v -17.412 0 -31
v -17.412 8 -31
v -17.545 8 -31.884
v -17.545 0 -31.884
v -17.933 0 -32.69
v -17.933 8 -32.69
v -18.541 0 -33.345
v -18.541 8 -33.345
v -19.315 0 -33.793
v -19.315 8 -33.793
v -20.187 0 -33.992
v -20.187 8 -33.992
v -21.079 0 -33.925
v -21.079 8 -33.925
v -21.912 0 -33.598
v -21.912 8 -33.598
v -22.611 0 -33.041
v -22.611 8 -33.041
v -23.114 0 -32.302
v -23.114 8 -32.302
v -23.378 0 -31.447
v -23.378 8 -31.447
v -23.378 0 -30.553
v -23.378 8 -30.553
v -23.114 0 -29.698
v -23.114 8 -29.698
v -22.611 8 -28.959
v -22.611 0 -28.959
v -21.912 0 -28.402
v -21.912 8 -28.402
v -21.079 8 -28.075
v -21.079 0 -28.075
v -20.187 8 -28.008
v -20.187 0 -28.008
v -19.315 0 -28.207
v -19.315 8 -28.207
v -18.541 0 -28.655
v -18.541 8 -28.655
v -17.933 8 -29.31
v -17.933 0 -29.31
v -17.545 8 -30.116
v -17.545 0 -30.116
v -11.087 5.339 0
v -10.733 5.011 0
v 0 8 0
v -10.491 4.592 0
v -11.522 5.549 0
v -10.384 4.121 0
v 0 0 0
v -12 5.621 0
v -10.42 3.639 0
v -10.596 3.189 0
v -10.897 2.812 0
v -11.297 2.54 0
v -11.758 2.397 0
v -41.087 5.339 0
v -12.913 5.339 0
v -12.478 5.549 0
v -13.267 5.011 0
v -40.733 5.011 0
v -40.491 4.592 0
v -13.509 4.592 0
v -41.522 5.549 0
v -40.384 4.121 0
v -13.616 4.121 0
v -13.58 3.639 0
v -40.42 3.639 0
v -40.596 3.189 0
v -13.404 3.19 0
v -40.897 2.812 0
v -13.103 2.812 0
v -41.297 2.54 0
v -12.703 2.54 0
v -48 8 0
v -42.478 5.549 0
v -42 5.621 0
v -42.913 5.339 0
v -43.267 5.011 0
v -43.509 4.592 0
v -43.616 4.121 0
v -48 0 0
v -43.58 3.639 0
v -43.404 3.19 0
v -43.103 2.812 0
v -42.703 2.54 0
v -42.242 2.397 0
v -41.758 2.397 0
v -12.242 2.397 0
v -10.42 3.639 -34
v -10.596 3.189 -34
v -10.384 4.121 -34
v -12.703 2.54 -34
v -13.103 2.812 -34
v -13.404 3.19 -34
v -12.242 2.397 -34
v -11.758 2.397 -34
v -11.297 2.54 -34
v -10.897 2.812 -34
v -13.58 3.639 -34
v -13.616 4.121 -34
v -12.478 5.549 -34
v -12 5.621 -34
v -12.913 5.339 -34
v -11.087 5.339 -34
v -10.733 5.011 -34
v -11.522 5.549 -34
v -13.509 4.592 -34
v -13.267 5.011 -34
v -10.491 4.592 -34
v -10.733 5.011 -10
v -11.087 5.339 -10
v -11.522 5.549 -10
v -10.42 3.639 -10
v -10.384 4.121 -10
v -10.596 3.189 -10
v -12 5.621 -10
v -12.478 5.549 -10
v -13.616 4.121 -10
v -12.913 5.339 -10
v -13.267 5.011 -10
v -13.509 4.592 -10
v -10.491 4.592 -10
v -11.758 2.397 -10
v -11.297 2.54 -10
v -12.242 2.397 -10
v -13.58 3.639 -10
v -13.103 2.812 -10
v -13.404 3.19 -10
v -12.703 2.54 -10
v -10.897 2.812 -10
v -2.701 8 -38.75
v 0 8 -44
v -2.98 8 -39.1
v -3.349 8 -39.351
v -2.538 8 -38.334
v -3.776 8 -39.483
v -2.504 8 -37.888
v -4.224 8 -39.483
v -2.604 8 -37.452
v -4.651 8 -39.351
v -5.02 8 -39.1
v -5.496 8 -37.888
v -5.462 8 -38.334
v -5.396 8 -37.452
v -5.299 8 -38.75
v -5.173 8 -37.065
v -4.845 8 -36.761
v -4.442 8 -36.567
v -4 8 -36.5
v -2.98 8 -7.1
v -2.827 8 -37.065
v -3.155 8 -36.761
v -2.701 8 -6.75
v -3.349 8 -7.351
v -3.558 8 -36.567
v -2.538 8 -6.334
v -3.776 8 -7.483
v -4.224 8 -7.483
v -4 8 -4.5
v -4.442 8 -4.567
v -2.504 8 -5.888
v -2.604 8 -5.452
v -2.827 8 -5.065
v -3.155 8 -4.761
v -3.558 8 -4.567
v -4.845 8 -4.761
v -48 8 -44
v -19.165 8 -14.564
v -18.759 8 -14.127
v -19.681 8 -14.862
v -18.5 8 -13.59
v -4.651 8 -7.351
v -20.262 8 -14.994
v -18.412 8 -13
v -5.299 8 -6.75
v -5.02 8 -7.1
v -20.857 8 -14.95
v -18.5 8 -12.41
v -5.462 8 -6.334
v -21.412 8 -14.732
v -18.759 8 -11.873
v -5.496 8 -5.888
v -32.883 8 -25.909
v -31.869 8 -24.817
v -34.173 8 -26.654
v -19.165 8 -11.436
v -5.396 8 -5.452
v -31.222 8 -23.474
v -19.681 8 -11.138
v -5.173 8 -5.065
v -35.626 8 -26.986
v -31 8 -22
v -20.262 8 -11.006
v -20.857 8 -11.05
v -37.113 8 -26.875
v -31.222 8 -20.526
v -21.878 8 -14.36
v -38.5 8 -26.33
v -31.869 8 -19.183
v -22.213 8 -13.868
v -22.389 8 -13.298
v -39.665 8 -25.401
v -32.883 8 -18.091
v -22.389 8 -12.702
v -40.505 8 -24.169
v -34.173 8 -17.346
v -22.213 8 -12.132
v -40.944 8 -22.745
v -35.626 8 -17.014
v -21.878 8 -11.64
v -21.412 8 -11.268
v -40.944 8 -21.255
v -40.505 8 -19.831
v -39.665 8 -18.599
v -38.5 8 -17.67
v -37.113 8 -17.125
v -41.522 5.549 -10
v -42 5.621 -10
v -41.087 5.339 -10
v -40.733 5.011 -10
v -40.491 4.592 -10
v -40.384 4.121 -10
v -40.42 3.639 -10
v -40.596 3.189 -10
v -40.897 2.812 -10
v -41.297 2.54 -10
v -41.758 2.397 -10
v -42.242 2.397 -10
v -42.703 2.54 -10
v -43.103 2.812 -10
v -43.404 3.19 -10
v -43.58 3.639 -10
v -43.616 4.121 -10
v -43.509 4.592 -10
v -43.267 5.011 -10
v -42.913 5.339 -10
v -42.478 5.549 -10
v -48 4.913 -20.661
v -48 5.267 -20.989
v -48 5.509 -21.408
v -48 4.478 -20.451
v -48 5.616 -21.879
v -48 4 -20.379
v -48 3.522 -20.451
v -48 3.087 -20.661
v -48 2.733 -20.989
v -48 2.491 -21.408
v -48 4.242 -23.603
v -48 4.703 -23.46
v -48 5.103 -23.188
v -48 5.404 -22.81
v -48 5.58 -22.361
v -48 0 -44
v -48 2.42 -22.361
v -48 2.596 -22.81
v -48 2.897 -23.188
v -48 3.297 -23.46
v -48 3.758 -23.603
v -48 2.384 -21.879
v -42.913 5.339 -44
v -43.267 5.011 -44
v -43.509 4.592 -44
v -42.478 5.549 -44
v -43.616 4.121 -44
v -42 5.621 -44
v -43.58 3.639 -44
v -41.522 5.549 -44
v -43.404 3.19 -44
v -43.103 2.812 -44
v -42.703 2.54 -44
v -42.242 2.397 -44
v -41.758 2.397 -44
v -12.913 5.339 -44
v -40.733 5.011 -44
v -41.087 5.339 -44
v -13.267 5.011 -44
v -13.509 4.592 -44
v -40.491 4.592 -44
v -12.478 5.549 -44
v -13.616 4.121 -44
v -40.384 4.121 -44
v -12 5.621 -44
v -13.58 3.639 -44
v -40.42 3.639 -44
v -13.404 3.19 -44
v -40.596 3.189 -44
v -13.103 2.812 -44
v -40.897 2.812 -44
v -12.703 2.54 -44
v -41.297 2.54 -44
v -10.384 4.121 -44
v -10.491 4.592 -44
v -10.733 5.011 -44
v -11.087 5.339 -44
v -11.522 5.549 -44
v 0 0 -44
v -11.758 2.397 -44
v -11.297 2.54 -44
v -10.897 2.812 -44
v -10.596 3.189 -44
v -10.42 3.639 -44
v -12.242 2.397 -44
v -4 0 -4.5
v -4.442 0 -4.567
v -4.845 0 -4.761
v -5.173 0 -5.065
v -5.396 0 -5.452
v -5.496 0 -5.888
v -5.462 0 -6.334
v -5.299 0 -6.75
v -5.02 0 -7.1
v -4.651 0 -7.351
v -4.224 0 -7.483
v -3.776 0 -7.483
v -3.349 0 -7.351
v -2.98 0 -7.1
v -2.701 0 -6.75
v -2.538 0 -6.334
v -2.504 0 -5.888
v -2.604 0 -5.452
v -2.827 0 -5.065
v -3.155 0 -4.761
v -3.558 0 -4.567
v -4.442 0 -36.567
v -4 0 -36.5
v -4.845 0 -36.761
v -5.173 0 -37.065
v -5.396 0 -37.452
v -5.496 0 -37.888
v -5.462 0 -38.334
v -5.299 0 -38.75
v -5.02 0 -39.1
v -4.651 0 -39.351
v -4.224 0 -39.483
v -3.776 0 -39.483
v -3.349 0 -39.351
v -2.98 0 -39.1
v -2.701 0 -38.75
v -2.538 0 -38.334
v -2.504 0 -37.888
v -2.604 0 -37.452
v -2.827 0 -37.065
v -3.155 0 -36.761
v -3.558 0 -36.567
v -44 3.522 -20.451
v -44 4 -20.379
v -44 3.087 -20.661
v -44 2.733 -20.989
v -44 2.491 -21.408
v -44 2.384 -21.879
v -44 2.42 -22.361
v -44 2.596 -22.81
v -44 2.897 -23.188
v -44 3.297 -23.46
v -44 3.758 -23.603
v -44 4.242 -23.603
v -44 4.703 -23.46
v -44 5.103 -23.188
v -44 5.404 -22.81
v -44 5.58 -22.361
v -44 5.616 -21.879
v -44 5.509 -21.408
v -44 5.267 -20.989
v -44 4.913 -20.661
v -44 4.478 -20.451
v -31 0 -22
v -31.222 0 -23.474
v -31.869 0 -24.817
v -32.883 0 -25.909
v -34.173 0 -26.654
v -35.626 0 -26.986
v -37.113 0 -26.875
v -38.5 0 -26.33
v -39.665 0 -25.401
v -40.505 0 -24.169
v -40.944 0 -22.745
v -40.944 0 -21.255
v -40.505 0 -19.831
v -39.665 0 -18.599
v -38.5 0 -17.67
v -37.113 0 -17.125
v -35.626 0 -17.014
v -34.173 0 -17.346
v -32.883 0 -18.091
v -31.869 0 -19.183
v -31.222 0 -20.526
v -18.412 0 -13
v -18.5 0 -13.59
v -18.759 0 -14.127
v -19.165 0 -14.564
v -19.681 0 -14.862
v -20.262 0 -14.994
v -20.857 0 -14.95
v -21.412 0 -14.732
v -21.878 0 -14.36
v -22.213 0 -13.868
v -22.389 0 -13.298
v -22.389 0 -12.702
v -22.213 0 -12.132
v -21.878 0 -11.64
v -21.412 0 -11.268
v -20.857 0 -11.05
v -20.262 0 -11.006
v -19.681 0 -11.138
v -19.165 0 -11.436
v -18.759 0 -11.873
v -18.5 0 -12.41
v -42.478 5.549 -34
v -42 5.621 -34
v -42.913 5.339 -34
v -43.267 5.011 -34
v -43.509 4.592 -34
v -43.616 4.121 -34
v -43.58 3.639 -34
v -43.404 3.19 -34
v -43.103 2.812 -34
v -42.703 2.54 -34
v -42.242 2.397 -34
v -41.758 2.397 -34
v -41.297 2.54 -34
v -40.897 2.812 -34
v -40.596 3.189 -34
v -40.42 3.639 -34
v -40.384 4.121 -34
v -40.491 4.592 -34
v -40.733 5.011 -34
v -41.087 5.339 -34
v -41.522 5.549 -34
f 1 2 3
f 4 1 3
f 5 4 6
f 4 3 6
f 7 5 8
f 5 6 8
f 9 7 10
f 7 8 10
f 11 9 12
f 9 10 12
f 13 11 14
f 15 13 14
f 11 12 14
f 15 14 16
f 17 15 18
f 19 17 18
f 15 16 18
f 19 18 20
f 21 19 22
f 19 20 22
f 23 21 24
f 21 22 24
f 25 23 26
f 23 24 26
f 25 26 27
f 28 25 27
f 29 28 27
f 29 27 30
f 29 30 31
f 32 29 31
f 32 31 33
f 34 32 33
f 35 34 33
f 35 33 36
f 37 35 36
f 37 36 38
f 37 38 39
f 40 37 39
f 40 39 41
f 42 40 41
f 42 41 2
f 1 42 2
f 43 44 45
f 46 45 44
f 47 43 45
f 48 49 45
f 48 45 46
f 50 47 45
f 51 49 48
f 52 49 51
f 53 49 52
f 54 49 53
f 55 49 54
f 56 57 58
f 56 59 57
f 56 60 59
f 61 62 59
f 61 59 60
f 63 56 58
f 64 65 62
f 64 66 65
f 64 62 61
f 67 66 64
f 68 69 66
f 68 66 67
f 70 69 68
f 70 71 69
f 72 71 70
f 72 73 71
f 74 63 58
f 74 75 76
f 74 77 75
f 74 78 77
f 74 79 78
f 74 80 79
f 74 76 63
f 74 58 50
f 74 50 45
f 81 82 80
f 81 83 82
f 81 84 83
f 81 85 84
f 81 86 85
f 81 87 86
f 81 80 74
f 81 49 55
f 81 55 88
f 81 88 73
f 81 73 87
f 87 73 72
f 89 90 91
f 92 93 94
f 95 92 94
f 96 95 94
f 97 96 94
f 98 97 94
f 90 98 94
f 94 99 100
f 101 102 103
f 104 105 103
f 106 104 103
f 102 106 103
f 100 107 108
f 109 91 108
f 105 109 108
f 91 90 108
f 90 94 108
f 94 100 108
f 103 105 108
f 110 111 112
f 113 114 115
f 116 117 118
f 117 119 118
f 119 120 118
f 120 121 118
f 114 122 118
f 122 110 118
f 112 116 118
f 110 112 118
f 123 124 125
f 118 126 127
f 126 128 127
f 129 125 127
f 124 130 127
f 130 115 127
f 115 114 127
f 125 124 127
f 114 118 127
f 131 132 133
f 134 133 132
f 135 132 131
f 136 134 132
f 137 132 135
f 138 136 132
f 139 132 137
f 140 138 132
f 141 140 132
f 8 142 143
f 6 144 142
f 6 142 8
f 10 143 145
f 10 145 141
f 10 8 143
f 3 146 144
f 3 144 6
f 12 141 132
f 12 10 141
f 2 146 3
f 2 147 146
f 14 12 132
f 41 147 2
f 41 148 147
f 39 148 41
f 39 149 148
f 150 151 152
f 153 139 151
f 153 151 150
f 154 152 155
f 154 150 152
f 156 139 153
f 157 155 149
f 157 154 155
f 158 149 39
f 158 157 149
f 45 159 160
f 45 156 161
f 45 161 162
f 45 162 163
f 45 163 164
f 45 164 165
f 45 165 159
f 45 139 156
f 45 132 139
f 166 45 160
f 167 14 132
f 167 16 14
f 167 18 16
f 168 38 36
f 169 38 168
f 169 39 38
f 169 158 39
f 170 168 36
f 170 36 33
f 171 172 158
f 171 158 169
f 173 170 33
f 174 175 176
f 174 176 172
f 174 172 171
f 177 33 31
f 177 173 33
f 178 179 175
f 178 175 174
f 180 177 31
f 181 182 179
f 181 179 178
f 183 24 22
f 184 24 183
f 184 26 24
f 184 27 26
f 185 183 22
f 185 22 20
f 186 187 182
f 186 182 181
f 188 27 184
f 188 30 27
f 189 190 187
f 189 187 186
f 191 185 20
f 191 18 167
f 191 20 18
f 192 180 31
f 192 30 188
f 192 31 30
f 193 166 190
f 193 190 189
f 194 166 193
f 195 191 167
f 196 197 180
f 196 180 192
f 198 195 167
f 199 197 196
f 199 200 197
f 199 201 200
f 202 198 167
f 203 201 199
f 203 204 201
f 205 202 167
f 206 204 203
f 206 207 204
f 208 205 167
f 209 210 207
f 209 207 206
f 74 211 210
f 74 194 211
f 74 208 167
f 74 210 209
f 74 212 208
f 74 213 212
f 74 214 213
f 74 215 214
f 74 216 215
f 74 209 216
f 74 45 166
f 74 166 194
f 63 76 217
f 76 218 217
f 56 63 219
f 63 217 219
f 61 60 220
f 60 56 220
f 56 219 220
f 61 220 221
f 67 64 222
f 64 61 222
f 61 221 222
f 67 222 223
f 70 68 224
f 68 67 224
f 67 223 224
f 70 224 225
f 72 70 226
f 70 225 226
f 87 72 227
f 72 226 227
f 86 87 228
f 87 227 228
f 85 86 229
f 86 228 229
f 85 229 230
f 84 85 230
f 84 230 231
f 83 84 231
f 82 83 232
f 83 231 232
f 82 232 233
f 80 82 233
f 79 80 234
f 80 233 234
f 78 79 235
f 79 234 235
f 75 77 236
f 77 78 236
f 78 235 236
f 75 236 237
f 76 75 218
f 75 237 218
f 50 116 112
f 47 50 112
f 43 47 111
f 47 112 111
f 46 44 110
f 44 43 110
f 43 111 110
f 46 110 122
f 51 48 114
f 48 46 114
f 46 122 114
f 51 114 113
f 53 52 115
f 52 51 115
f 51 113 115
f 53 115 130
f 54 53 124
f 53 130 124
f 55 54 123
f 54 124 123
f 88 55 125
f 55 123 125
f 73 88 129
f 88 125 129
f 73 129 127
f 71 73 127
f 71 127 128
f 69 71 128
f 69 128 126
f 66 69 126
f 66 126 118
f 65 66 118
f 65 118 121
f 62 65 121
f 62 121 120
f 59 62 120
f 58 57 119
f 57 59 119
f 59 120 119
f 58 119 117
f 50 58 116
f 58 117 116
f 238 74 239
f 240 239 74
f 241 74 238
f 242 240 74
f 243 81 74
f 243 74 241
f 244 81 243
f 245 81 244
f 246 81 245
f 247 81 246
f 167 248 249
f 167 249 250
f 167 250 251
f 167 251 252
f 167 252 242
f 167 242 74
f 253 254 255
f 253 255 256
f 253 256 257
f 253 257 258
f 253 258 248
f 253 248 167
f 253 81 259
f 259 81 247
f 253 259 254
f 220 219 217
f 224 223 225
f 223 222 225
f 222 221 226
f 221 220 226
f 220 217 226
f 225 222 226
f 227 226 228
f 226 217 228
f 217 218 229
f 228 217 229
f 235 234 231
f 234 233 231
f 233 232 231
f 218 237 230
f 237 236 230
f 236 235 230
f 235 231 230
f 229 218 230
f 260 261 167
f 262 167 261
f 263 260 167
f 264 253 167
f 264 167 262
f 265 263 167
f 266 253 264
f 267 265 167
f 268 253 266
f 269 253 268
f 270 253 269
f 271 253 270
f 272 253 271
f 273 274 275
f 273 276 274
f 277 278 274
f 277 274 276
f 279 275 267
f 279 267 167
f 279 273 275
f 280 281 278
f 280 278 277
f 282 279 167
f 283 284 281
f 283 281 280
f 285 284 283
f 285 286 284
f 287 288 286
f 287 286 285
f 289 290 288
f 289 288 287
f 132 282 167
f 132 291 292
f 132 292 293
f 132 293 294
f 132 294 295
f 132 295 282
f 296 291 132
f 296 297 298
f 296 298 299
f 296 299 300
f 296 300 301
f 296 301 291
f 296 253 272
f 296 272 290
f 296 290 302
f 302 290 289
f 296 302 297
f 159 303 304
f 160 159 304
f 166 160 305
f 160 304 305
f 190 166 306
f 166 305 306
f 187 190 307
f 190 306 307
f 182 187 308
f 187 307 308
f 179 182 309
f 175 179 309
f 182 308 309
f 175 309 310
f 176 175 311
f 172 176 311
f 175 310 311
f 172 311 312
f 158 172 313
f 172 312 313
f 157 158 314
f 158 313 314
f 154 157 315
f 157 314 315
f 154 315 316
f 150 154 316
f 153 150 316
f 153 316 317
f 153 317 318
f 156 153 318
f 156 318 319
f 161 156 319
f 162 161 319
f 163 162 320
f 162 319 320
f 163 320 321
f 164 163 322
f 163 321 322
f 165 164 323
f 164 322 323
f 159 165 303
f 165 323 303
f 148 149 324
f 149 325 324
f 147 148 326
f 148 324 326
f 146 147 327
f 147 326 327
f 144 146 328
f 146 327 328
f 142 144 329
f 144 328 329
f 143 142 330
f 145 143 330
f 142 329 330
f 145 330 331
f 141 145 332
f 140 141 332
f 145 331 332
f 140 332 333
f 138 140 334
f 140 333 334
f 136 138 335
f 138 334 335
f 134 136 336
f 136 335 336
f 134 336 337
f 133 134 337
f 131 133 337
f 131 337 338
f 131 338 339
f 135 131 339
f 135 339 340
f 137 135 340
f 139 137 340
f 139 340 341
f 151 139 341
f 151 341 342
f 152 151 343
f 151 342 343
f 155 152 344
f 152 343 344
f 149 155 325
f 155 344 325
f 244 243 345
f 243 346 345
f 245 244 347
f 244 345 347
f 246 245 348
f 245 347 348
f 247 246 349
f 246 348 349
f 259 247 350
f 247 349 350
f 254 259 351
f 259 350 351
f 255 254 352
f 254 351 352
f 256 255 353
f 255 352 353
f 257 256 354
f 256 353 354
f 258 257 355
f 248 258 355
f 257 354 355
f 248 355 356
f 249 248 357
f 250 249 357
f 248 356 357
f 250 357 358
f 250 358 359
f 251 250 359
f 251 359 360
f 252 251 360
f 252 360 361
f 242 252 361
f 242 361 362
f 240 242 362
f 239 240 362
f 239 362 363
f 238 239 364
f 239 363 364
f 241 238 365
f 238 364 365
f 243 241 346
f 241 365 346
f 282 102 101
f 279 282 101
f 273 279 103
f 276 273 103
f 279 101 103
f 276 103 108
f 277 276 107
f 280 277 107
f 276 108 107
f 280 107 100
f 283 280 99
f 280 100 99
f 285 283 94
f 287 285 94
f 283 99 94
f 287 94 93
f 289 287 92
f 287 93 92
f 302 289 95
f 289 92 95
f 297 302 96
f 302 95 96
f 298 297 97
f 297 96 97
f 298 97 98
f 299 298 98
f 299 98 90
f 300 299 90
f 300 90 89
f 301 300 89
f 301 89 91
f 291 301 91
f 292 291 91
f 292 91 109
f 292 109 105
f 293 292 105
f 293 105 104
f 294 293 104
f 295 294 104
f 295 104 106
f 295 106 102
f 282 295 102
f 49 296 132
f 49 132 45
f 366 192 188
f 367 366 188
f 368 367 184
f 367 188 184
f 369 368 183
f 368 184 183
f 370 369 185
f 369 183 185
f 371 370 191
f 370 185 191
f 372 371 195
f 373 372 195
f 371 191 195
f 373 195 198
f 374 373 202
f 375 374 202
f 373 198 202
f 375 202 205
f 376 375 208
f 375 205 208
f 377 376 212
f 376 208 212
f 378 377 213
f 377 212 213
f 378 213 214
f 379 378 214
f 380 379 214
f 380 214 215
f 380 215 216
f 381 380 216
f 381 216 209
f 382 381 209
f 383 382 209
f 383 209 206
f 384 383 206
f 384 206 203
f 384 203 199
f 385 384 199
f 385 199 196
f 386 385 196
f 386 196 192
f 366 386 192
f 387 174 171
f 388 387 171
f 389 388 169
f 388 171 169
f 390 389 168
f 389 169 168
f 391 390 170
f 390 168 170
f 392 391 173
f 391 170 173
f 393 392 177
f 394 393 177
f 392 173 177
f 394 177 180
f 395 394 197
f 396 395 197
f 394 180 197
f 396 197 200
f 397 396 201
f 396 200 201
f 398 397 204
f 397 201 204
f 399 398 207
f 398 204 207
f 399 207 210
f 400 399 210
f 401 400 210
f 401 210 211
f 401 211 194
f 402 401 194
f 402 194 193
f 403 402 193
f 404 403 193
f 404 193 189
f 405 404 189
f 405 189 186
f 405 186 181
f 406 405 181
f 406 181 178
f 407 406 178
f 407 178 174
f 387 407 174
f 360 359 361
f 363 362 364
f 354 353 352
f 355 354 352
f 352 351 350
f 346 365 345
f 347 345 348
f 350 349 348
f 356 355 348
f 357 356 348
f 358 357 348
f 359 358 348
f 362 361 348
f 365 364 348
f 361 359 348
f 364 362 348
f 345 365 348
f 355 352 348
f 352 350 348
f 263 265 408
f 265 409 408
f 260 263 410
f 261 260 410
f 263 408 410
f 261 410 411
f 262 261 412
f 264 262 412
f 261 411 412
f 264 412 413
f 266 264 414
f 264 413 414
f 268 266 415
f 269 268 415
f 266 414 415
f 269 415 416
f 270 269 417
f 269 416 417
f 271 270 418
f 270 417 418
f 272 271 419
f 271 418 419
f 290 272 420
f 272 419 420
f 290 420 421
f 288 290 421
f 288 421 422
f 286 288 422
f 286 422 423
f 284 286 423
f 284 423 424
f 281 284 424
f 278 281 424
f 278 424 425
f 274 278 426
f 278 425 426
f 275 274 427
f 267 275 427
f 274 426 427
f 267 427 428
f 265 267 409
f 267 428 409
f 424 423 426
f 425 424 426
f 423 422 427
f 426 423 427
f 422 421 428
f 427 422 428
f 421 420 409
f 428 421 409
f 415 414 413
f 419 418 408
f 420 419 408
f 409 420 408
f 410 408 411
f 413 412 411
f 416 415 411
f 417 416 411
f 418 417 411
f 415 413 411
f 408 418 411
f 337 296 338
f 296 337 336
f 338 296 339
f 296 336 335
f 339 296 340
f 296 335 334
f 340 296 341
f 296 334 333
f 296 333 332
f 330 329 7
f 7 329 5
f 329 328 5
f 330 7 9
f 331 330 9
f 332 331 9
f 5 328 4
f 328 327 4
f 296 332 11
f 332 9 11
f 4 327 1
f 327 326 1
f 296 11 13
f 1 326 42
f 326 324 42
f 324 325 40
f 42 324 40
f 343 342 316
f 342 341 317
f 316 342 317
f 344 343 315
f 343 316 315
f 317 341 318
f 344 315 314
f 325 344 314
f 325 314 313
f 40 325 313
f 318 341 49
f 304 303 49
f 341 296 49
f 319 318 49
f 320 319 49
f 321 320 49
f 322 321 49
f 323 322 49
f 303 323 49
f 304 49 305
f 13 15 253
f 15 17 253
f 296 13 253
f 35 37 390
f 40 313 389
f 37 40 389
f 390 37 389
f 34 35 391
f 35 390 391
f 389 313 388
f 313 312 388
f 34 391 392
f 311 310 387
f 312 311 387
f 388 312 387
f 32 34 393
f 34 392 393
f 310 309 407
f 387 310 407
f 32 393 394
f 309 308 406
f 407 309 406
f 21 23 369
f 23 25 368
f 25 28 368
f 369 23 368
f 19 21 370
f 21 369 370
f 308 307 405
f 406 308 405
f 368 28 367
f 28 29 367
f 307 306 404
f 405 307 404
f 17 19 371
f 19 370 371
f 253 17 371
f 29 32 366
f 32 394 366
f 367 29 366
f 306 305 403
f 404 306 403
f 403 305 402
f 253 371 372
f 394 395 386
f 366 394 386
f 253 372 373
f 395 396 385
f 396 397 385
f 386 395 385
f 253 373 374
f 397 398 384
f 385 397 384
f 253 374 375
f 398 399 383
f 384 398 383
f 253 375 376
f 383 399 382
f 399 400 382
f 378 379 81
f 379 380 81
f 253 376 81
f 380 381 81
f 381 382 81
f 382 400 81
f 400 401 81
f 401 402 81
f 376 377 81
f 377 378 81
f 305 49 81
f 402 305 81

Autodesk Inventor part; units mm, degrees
ref_plane "YZ Plane" through (0, 0, 0) normal (1, 0, 0) x (0, 1, 0)
ref_plane "XZ Plane" through (0, 0, 0) normal (0, 1, 0) x (-1, 0, 0)
sketch "Skizze1" plane through (0, 0, 0) normal (0, 1, 0) x (-1, 0, 0)
  line L0 (0, 0) -> (48, 0)
  line L1 (48, 0) -> (48, -44)
  line L2 (48, -44) -> (0, -44)
  line L3 (0, -44) -> (0, 0)
  dimension "d0" = 44
  dimension "d1" = 48
extrude "Extrusion1" add sketch "Skizze1" along normal blind 8
sketch "Skizze2" plane through (0, 8, 0) normal (0, 1, 0) x (1, 0, 0)
  circle A0 centre (-36, 22) radius 5
  circle A1 centre (-20.4115, 13) radius 2
  circle A2 centre (-20.4115, 31) radius 3
  line L0 (0, 0) -> (0, 44) projected
  line L1 (0, 22) -> (-47.9314, 22) construction
  line L2 (-48, 44) -> (-48, 0) projected
  dimension "d4" = 9
  dimension "d5" = 12
  dimension "d6" = 10
  dimension "d7" = 18
  dimension "d8" = 4
  dimension "d9" = 6
extrude "Extrusion2" cut sketch "Skizze2" against normal up to surface (8 mm away)
sketch "Skizze3" plane through (-48, 0, -44) normal (-1, 0, 0) x (0, 0, 1)
  line L0 (44, 0) -> (44, 8) projected
  line L1 (0, 0) -> (44, 0) projected
  point P0 (22, 4)
  point P1 (44, 4)
  point P2 (22, 0)
hole "Bohrung1" at (-48, 4, -22) direction (1, 0, 0) diameter 3.242 depth 4 thread size "M4x0.7" class "6H" standard "ISO Metric profile"
sketch "Skizze4" plane through (0, 8, 0) normal (0, 1, 0) x (1, 0, 0)
  line L0 (0, 0) -> (0, 44) projected
  line L1 (-48, 0) -> (0, 0) projected
  point P0 (-4, 6)
  point P1 (-4, 38)
  dimension "d26" = 4
  dimension "d27" = 6
  dimension "d28" = 32
hole "Bohrung2" at (-4, 8, -6) at (-4, 8, -38) direction (0, -1, 0) diameter 3 depth 8
sketch "Skizze5" plane through (0, 0, -44) normal (0, 0, -1) x (-1, 0, 0)
  line L0 (48, 0) -> (48, 8) projected
  line L1 (0, 0) -> (0, 8) projected
  point P0 (12, 4)
  point P1 (42, 4)
  point P2 (48, 4)
  dimension "d36" = 30
  dimension "d37" = 12
hole "Bohrung3" at (-12, 4, -44) at (-42, 4, -44) direction (0, 0, 1) diameter 3.242 depth 10 thread size "M4x0.7" class "6H" standard "ISO Metric profile"
ref_plane "Arbeitsebene1" through (0, 0, -22) normal (0, 0, 1) x (1, 0, 0)
mirror "Spiegeln1" about plane through (0, 0, -22) normal (0, 0, 1) of "Bohrung3"
properties part number "1014"
